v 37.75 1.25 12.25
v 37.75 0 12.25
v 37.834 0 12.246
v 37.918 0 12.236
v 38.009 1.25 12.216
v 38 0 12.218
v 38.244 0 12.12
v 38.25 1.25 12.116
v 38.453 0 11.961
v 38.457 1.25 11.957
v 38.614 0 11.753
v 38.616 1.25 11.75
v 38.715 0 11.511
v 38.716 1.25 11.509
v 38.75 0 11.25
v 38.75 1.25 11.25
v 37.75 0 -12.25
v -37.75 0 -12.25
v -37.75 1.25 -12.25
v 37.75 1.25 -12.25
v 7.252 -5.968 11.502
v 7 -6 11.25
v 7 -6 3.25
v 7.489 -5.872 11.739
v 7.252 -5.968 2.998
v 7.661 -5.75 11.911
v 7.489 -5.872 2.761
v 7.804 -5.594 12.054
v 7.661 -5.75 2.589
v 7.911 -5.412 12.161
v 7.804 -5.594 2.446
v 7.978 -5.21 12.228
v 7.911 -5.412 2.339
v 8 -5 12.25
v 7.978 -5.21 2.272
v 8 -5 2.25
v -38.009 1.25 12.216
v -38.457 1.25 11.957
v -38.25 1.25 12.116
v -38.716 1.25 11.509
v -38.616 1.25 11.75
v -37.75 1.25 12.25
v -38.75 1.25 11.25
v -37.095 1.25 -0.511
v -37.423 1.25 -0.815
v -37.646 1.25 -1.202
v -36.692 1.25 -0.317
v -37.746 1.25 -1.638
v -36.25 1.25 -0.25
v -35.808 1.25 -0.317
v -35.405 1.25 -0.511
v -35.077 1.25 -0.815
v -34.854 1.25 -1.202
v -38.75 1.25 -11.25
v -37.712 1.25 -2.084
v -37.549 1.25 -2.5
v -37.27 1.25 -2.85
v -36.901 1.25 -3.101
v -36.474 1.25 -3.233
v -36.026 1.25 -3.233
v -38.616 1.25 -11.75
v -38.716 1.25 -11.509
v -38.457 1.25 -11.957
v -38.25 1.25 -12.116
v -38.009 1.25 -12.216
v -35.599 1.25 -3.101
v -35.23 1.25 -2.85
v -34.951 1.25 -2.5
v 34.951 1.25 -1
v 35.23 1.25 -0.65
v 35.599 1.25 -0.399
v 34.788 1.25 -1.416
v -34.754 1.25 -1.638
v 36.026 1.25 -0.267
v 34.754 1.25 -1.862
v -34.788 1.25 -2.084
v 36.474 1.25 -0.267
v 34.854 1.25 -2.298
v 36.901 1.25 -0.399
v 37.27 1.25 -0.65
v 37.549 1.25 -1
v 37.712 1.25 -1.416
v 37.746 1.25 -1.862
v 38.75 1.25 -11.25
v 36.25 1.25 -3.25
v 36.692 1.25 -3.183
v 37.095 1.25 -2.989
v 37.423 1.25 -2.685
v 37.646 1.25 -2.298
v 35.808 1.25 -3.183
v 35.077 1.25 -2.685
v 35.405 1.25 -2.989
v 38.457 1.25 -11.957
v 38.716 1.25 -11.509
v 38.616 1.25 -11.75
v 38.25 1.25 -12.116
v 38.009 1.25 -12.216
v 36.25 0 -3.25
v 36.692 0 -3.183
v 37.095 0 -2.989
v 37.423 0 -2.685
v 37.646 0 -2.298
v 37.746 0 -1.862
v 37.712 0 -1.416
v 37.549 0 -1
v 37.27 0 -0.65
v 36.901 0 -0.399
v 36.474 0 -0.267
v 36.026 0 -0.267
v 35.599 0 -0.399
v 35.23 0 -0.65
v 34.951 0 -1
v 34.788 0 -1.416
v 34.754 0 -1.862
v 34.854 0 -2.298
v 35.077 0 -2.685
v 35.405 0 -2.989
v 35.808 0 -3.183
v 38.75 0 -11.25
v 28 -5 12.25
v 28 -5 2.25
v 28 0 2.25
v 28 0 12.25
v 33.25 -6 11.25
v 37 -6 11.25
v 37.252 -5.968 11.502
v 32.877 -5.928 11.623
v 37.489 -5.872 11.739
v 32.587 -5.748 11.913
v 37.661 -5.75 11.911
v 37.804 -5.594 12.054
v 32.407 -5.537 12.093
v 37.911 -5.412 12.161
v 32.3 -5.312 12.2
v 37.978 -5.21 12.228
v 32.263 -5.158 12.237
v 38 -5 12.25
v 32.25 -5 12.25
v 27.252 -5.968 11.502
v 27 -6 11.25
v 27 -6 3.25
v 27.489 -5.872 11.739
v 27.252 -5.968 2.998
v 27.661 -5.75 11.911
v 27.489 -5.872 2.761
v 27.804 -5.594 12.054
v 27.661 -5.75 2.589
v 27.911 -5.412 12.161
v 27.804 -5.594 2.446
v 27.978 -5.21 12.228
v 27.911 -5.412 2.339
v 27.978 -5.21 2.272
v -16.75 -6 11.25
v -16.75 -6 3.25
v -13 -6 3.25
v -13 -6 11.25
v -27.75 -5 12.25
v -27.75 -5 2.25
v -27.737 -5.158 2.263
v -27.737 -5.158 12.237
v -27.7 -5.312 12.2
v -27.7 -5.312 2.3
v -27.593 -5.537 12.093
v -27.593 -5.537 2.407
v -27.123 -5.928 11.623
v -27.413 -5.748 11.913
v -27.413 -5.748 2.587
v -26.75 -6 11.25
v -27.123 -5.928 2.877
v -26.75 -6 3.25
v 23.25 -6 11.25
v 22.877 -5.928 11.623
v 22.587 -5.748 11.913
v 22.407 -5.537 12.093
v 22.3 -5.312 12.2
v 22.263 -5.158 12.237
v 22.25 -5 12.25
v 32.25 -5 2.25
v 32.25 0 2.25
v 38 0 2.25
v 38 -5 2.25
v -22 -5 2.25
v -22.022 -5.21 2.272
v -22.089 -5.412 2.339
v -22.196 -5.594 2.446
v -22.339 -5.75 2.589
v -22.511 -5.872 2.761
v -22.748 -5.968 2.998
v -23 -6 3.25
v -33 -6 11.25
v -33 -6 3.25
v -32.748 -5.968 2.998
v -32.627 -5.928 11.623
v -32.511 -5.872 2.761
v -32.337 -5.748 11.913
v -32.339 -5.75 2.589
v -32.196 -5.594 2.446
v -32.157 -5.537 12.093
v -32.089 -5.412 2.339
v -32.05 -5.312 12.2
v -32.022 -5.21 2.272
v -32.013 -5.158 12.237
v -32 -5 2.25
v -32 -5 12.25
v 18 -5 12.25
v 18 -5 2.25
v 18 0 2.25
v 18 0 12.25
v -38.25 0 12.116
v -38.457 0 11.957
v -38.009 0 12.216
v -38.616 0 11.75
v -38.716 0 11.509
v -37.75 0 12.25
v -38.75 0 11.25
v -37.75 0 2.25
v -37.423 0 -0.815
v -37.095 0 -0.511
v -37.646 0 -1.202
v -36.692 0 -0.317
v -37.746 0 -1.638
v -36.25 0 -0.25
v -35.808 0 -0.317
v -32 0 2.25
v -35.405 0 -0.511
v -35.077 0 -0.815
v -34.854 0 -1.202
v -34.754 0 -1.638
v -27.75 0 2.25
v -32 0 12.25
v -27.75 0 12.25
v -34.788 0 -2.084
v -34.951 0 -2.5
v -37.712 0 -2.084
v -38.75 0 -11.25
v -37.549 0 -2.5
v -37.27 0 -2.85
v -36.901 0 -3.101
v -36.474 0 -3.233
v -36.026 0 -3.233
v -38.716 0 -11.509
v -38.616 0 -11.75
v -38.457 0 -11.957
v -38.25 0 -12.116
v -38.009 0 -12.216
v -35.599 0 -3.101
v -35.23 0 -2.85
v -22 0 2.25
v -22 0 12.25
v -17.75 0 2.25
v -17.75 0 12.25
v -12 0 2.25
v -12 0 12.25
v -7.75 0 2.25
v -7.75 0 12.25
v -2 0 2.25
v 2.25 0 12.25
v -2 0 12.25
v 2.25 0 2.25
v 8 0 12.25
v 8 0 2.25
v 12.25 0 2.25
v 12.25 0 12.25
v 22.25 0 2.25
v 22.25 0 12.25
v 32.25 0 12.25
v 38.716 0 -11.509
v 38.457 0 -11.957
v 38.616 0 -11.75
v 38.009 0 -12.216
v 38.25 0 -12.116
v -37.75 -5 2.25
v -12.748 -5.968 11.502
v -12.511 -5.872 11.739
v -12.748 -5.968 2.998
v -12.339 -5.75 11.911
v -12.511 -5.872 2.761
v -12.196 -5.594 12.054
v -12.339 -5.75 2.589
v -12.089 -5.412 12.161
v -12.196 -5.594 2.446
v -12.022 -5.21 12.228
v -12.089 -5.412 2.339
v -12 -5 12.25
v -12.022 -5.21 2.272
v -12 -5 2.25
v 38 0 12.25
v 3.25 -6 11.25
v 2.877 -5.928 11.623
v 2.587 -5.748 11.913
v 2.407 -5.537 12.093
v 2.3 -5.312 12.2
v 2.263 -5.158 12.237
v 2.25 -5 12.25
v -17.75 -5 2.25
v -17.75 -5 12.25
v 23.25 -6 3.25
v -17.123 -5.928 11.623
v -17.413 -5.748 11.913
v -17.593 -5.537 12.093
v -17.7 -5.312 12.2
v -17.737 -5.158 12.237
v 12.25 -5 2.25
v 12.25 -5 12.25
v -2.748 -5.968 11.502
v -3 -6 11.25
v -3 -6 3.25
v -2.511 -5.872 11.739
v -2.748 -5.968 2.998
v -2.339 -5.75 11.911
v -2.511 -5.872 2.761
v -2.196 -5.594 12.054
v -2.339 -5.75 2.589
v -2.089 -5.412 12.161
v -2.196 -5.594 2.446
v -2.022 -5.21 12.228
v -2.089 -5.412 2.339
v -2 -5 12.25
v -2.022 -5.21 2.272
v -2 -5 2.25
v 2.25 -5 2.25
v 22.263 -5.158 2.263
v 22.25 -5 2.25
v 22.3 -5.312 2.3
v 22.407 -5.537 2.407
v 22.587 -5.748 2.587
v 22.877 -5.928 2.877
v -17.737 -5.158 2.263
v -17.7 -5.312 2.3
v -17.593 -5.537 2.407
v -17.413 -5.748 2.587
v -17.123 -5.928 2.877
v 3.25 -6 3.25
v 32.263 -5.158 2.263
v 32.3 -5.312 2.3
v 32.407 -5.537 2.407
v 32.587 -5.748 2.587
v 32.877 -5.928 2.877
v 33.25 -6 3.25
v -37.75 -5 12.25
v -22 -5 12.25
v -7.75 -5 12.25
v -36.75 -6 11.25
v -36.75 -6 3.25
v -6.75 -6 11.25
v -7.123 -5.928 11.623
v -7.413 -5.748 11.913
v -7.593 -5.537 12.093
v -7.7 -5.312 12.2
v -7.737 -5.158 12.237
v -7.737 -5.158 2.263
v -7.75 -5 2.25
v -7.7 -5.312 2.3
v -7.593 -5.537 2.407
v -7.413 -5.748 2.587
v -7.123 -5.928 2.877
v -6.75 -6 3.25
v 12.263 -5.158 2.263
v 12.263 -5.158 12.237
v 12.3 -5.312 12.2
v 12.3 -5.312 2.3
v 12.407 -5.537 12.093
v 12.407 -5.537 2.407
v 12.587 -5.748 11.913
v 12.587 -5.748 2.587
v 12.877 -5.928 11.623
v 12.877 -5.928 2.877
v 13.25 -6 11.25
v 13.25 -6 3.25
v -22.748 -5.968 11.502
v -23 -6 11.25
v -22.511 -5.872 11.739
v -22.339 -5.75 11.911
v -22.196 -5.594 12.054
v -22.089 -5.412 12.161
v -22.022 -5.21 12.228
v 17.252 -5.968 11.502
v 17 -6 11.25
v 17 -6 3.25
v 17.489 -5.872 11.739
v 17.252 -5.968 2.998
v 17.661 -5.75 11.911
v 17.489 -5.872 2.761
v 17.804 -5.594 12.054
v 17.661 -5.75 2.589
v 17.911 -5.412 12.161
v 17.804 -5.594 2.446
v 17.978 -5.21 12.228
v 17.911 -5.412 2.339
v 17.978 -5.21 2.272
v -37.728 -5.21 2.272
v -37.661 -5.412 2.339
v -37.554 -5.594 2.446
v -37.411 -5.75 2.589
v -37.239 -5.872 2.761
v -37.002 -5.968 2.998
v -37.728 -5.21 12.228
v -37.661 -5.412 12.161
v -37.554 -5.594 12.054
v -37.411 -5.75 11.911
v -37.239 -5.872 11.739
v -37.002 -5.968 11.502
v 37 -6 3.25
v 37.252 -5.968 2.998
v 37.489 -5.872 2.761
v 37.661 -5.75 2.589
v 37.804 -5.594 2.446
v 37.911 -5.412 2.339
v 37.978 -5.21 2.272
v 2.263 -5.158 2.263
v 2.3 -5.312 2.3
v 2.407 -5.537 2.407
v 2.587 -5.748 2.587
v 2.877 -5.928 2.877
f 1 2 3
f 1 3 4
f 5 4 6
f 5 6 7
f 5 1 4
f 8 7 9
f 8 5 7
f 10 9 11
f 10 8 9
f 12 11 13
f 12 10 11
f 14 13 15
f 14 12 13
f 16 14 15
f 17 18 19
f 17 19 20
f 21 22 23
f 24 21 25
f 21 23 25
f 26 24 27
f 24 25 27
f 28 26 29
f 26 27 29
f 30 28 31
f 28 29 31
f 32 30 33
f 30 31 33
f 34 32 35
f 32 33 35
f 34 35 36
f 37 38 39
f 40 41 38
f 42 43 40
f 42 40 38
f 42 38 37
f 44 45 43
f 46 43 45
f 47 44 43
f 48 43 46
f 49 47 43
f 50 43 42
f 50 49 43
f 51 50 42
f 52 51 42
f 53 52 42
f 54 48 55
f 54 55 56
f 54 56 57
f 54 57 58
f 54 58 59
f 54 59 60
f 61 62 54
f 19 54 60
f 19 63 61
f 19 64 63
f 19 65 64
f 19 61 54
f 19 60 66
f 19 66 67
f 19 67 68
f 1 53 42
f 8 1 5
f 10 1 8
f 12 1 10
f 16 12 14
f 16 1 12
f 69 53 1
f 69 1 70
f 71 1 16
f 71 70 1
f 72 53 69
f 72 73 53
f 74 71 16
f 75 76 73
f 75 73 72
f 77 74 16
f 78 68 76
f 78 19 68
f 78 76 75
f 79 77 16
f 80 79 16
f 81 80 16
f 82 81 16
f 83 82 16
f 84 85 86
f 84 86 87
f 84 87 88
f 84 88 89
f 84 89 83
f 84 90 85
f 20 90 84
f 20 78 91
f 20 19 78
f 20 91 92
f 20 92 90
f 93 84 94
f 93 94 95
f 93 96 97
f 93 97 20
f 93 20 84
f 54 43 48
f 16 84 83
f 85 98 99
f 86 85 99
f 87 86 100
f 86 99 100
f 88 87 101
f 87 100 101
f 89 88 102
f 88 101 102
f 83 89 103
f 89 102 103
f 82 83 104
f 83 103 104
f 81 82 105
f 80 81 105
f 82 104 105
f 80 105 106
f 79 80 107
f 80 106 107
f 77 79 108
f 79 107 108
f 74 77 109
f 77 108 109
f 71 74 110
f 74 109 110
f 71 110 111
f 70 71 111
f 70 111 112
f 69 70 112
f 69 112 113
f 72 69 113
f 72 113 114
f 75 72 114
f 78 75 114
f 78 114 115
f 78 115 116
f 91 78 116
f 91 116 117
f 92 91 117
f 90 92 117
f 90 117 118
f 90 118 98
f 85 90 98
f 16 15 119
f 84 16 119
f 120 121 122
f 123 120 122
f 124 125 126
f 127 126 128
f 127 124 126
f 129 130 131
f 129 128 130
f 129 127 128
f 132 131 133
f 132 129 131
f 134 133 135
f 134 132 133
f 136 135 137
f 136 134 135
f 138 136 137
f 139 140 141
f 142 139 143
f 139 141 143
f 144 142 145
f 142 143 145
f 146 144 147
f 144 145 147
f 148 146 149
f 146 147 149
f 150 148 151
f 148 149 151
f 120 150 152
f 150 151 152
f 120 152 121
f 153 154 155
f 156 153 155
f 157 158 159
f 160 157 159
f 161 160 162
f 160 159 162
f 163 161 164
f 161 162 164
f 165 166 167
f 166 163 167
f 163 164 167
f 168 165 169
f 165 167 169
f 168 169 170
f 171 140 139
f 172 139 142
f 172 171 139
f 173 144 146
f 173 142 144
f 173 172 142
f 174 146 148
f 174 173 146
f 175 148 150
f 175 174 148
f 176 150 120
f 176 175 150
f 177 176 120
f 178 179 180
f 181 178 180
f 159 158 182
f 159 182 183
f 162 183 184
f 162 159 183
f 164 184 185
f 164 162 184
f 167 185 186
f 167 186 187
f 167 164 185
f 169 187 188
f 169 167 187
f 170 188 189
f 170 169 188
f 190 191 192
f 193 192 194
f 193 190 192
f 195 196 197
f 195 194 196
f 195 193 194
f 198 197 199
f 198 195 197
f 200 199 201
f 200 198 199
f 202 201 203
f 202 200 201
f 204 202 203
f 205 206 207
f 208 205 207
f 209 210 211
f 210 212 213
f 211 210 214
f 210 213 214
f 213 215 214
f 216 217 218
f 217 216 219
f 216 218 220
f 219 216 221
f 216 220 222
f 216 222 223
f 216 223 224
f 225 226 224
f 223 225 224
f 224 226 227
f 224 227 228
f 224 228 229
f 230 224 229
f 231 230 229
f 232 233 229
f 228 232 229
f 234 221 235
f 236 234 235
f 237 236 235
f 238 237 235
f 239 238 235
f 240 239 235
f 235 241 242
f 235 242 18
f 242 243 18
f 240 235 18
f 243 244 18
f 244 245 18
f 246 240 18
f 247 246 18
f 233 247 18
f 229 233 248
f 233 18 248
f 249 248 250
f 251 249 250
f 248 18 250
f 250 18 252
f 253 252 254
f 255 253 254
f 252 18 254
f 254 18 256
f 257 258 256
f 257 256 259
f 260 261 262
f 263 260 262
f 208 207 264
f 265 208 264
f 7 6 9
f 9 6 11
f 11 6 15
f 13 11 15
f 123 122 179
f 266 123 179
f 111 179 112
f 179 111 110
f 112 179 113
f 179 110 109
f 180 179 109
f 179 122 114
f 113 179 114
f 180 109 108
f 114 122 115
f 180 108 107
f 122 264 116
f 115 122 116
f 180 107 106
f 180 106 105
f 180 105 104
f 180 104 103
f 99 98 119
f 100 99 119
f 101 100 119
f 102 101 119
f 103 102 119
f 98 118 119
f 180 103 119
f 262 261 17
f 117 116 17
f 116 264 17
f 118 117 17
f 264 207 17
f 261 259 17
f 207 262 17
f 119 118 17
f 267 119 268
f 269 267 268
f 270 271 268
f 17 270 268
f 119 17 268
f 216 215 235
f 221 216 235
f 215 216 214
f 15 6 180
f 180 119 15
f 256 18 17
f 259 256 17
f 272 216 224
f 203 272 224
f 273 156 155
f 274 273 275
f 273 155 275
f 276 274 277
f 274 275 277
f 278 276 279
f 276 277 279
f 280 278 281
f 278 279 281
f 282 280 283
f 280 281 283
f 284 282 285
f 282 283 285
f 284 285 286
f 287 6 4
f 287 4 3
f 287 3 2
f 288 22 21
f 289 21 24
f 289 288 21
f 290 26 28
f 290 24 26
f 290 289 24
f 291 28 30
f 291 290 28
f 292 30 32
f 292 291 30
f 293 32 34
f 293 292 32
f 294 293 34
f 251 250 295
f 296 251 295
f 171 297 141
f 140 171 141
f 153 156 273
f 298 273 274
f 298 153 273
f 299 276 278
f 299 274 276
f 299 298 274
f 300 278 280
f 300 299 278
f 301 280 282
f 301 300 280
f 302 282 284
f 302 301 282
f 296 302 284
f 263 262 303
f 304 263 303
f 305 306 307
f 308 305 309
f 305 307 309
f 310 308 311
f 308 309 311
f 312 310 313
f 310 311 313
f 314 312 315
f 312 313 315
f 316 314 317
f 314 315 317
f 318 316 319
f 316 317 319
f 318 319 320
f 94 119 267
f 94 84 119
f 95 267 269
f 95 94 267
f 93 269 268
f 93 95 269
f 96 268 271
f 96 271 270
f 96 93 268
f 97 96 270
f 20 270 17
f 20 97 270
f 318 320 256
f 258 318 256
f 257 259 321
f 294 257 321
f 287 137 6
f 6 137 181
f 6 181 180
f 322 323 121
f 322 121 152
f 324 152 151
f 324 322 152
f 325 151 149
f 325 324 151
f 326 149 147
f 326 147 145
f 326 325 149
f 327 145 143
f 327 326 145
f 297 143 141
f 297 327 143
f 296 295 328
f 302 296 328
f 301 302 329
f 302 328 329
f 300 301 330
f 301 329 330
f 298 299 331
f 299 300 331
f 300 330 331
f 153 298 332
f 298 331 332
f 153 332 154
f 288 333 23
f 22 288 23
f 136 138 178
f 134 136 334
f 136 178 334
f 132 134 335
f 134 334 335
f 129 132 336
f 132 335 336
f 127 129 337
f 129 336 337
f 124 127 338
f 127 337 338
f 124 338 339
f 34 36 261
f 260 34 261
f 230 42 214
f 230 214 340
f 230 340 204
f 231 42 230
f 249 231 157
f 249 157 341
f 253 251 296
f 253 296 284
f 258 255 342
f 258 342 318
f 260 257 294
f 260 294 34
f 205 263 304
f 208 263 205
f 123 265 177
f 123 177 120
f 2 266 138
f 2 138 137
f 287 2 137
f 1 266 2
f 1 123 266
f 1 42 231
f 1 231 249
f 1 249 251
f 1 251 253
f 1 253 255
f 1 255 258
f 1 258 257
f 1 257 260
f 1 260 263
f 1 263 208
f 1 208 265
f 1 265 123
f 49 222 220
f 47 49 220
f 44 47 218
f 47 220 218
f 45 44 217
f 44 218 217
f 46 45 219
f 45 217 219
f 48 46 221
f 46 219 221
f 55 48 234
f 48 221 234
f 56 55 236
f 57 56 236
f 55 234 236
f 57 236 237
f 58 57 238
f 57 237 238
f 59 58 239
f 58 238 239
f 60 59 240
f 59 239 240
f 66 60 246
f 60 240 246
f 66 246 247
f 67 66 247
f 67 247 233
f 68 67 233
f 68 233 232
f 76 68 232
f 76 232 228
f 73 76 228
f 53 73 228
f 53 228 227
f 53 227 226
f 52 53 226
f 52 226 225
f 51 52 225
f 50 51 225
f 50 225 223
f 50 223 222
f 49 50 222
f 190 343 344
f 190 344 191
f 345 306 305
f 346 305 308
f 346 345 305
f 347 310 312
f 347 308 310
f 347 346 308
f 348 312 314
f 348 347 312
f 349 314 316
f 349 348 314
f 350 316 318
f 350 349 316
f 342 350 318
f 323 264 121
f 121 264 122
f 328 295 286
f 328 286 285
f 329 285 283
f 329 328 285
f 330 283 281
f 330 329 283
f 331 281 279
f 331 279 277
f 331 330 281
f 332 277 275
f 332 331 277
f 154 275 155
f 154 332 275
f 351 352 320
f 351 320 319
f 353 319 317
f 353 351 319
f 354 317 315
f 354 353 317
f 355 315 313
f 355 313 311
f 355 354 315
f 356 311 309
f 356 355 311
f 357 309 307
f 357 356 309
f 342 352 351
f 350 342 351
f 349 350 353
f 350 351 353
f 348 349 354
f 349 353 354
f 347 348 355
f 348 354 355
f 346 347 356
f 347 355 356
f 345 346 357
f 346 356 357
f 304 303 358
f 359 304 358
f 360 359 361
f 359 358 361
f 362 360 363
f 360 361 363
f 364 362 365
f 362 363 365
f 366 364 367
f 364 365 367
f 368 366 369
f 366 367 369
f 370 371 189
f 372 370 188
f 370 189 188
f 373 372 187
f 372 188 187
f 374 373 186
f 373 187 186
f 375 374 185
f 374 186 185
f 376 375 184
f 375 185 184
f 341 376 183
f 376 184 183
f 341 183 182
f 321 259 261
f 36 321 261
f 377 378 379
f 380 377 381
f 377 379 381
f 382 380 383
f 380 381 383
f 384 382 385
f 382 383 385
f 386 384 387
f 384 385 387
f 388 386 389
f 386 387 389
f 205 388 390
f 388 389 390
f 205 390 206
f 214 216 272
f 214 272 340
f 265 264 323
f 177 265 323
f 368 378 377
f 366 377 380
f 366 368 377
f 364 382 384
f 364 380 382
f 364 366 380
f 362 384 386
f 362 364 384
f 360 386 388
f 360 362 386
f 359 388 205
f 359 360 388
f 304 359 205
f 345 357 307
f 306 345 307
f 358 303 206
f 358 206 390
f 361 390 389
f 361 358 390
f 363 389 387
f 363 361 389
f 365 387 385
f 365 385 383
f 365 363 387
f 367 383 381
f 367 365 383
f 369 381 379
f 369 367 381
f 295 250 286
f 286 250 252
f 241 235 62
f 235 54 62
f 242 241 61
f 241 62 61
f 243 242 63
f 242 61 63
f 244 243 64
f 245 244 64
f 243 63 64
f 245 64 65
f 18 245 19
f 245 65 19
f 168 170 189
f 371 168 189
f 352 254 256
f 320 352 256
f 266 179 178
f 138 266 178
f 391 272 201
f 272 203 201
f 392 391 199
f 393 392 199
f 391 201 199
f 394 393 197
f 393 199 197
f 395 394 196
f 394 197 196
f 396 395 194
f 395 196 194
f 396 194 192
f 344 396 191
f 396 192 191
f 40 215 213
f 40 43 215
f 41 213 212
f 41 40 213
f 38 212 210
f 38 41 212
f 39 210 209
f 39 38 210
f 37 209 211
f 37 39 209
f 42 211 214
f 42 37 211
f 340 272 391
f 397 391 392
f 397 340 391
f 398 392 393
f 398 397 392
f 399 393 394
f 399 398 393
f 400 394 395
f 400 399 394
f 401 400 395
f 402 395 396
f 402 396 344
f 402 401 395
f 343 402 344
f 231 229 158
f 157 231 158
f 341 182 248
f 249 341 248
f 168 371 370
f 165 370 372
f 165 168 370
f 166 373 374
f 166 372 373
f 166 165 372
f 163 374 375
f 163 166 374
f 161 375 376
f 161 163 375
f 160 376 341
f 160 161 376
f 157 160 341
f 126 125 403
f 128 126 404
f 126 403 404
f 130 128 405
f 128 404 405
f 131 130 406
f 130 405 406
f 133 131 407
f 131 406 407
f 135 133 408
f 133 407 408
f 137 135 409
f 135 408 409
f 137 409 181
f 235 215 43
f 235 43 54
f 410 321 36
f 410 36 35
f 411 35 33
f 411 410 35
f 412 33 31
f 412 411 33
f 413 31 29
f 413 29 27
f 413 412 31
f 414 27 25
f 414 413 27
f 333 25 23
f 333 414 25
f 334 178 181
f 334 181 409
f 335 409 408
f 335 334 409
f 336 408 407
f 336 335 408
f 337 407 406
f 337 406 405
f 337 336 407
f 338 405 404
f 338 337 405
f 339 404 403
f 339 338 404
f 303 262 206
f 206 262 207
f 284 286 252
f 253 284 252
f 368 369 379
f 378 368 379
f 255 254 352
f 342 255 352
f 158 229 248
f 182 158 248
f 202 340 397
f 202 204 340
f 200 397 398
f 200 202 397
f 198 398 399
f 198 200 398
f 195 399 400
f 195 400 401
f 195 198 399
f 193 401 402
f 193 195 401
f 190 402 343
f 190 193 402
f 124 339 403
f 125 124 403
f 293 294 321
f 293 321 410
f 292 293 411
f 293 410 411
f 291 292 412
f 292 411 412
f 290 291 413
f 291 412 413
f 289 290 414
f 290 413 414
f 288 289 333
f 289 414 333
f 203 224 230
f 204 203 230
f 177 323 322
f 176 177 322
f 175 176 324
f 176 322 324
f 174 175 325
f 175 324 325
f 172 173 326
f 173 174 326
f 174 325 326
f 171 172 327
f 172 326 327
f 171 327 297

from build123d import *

# Parameters (mm, degrees)
SKETCH1_W           = 77.5
SKETCH1_H           = 24.5
BOSS_EXTRUDE1_DEPTH = 1.25
FILLET1_R           = 1
CUT_EXTRUDE1_REACH  = 42.659
SKETCH2_R           = 1.5
SKETCH3_W           = 5.75
SKETCH3_H           = 10
BOSS_EXTRUDE2_DEPTH = 6
FILLET2_R           = 1
LPATTERN1_START     = 2.25
LPATTERN1_DEPTH     = 10
LPATTERN1_START_2   = -37.75
LPATTERN1_2_DEPTH   = 76.75


with BuildPart() as part:
    # Sketch1 → Boss-Extrude1 (new body)
    with BuildSketch(Plane(origin=(0, 0, 0), x_dir=(1, 0, 0), z_dir=(0, 1, 0))):
        Rectangle(SKETCH1_W, SKETCH1_H)
    extrude(amount=BOSS_EXTRUDE1_DEPTH)

    # Fillet1
    fillet1_edges = [part.edges().sort_by_distance(p)[0] for p in [
        (38.75, 0.625, 12.25),
        (-38.75, 0.625, 12.25),
        (-38.75, 0.625, -12.25),
        (38.75, 0.625, -12.25),
    ]]
    fillet(fillet1_edges, radius=FILLET1_R)

    # Sketch2 → Cut-Extrude1 (cut, up to next)
    with BuildSketch(Plane.XZ, mode=Mode.PRIVATE) as cut_extrude1_sk1:
        with Locations(Location((36.25, -1.75, 0), (0, 0, 270))):
            Circle(SKETCH2_R)
    cut_extrude1_tool1 = extrude(cut_extrude1_sk1.sketch, amount=-CUT_EXTRUDE1_REACH, mode=Mode.PRIVATE) & part.part
    # Sketch2 → Cut-Extrude1 (cut, up to next)
    with BuildSketch(Plane.XZ, mode=Mode.PRIVATE) as cut_extrude1_sk2:
        with Locations(Location((-36.25, -1.75, 0), (0, 0, 90))):
            Circle(SKETCH2_R)
    cut_extrude1_tool2 = extrude(cut_extrude1_sk2.sketch, amount=-CUT_EXTRUDE1_REACH, mode=Mode.PRIVATE) & part.part
    add(cut_extrude1_tool1.solids().sort_by_distance((36.25, 0, -1.75))[0], mode=Mode.SUBTRACT)
    add(cut_extrude1_tool2.solids().sort_by_distance((-36.25, 0, -1.75))[0], mode=Mode.SUBTRACT)

    # Sketch3 → Boss-Extrude2 (add)
    with BuildSketch(Plane.XZ):
        with Locations((-34.875, 7.25)):
            Rectangle(SKETCH3_W, SKETCH3_H)
    extrude(amount=BOSS_EXTRUDE2_DEPTH)

    # Fillet2
    fillet2_edges = [part.edges().sort_by_distance(p)[0] for p in [
        (-37.75, -6, 7.25),
        (-34.875, -6, 2.25),
        (-32, -6, 7.25),
        (-34.875, -6, 12.25),
    ]]
    fillet(fillet2_edges, radius=FILLET2_R)

    # LPattern1: read off the stored shape, not the designer's step
    # LPattern1 outline → LPattern1 (add)
    with BuildSketch(Plane.XY.offset(LPATTERN1_START)):
        with BuildLine():
            ThreePointArc((-27.75, -5), (-27.457106781, -5.707106781), (-26.75, -6))
            Line((-26.75, -6), (-23, -6))
            ThreePointArc((-23, -6), (-22.292893219, -5.707106781), (-22, -5))
            Line((-22, -5), (-22, 0))
            Line((-22, 0), (-27.75, 0))
            Line((-27.75, 0), (-27.75, -5))
        make_face()
        with BuildLine():
            Line((38, 0), (32.25, 0))
            Line((32.25, 0), (32.25, -5))
            ThreePointArc((32.25, -5), (32.542893219, -5.707106781), (33.25, -6))
            Line((33.25, -6), (37, -6))
            ThreePointArc((37, -6), (37.707106781, -5.707106781), (38, -5))
            Line((38, -5), (38, 0))
        make_face()
        with BuildLine():
            Line((28, 0), (22.25, 0))
            Line((22.25, 0), (22.25, -5))
            ThreePointArc((22.25, -5), (22.542893219, -5.707106781), (23.25, -6))
            Line((23.25, -6), (27, -6))
            ThreePointArc((27, -6), (27.707106781, -5.707106781), (28, -5))
            Line((28, -5), (28, 0))
        make_face()
        with BuildLine():
            Line((18, 0), (12.25, 0))
            Line((12.25, 0), (12.25, -5))
            ThreePointArc((12.25, -5), (12.542893219, -5.707106781), (13.25, -6))
            Line((13.25, -6), (17, -6))
            ThreePointArc((17, -6), (17.707106781, -5.707106781), (18, -5))
            Line((18, -5), (18, 0))
        make_face()
        with BuildLine():
            Line((8, 0), (2.25, 0))
            Line((2.25, 0), (2.25, -5))
            ThreePointArc((2.25, -5), (2.542893219, -5.707106781), (3.25, -6))
            Line((3.25, -6), (7, -6))
            ThreePointArc((7, -6), (7.707106781, -5.707106781), (8, -5))
            Line((8, -5), (8, 0))
        make_face()
        with BuildLine():
            Line((-2, 0), (-7.75, 0))
            Line((-7.75, 0), (-7.75, -5))
            ThreePointArc((-7.75, -5), (-7.457106781, -5.707106781), (-6.75, -6))
            Line((-6.75, -6), (-3, -6))
            ThreePointArc((-3, -6), (-2.292893219, -5.707106781), (-2, -5))
            Line((-2, -5), (-2, 0))
        make_face()
        with BuildLine():
            Line((-12, 0), (-17.75, 0))
            Line((-17.75, 0), (-17.75, -5))
            ThreePointArc((-17.75, -5), (-17.457106781, -5.707106781), (-16.75, -6))
            Line((-16.75, -6), (-13, -6))
            ThreePointArc((-13, -6), (-12.292893219, -5.707106781), (-12, -5))
            Line((-12, -5), (-12, 0))
        make_face()
    extrude(amount=LPATTERN1_DEPTH)

    # LPattern1 2 outline → LPattern1 2 (cut)
    with BuildSketch(Plane.YZ.offset(LPATTERN1_START_2)):
        with BuildLine():
            Line((-6, 2.25), (-5, 2.25))
            ThreePointArc((-5, 2.25), (-5.707106781, 2.542893219), (-6, 3.25))
            Line((-6, 3.25), (-6, 2.25))
        make_face()
        with BuildLine():
            Line((-6, 12.25), (-6, 11.25))
            ThreePointArc((-6, 11.25), (-5.707106781, 11.957106781), (-5, 12.25))
            Line((-5, 12.25), (-6, 12.25))
        make_face()
    extrude(amount=LPATTERN1_2_DEPTH, mode=Mode.SUBTRACT)


solid = part.part
